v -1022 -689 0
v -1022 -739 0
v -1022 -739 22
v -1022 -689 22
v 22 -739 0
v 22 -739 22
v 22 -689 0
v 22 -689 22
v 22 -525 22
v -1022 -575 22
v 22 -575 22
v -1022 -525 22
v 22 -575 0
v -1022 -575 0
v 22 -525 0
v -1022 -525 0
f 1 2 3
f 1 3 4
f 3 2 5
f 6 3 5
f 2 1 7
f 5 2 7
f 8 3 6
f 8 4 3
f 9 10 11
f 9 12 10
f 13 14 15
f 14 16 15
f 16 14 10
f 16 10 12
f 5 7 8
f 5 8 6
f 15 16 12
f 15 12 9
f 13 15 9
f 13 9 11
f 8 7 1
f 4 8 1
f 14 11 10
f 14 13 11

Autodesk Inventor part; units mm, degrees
ref_plane "YZ Plane" through (0, 0, 0) normal (1, 0, 0) x (0, 1, 0)
ref_plane "XZ Plane" through (0, 0, 0) normal (0, 1, 0) x (-1, 0, 0)
ref_plane "XY Plane" through (0, 0, 0) normal (0, 0, 1) x (1, 0, 0)
sketch "Sketch1" plane through (0, 0, 0) normal (0, 0, 1) x (1, 0, 0)
  circle A0 centre (-290, -632) radius 55 projected
  line L0 (22, 0) -> (22, -1544) projected
  line L1 (-1022, -1544) -> (-1022, 0) projected
  line L2 (-290, -632) -> (22, -632) construction
  line L3 (22, -575) -> (-1022, -575)
  line L4 (-1022, -575) -> (-1022, -525)
  line L5 (-1022, -525) -> (22, -525)
  line L6 (22, -525) -> (22, -575)
  line L7 (-290, -632) -> (-290, -492.7476) construction
  line L8 (22, -689) -> (-1022, -689)
  line L9 (-1022, -689) -> (-1022, -739)
  line L10 (-1022, -739) -> (22, -739)
  line L11 (22, -739) -> (22, -689)
  point P0 (0, 0)
  point P1 (-290, -771.2524)
  dimension "d1" = 50
  dimension "d2" = 57
extrude "Extrusion1" add sketch "Sketch1" along normal blind 22 contours L0 L3 L1 L5 | L0 L10 L1 L8
properties part number "Fan_oulet"
